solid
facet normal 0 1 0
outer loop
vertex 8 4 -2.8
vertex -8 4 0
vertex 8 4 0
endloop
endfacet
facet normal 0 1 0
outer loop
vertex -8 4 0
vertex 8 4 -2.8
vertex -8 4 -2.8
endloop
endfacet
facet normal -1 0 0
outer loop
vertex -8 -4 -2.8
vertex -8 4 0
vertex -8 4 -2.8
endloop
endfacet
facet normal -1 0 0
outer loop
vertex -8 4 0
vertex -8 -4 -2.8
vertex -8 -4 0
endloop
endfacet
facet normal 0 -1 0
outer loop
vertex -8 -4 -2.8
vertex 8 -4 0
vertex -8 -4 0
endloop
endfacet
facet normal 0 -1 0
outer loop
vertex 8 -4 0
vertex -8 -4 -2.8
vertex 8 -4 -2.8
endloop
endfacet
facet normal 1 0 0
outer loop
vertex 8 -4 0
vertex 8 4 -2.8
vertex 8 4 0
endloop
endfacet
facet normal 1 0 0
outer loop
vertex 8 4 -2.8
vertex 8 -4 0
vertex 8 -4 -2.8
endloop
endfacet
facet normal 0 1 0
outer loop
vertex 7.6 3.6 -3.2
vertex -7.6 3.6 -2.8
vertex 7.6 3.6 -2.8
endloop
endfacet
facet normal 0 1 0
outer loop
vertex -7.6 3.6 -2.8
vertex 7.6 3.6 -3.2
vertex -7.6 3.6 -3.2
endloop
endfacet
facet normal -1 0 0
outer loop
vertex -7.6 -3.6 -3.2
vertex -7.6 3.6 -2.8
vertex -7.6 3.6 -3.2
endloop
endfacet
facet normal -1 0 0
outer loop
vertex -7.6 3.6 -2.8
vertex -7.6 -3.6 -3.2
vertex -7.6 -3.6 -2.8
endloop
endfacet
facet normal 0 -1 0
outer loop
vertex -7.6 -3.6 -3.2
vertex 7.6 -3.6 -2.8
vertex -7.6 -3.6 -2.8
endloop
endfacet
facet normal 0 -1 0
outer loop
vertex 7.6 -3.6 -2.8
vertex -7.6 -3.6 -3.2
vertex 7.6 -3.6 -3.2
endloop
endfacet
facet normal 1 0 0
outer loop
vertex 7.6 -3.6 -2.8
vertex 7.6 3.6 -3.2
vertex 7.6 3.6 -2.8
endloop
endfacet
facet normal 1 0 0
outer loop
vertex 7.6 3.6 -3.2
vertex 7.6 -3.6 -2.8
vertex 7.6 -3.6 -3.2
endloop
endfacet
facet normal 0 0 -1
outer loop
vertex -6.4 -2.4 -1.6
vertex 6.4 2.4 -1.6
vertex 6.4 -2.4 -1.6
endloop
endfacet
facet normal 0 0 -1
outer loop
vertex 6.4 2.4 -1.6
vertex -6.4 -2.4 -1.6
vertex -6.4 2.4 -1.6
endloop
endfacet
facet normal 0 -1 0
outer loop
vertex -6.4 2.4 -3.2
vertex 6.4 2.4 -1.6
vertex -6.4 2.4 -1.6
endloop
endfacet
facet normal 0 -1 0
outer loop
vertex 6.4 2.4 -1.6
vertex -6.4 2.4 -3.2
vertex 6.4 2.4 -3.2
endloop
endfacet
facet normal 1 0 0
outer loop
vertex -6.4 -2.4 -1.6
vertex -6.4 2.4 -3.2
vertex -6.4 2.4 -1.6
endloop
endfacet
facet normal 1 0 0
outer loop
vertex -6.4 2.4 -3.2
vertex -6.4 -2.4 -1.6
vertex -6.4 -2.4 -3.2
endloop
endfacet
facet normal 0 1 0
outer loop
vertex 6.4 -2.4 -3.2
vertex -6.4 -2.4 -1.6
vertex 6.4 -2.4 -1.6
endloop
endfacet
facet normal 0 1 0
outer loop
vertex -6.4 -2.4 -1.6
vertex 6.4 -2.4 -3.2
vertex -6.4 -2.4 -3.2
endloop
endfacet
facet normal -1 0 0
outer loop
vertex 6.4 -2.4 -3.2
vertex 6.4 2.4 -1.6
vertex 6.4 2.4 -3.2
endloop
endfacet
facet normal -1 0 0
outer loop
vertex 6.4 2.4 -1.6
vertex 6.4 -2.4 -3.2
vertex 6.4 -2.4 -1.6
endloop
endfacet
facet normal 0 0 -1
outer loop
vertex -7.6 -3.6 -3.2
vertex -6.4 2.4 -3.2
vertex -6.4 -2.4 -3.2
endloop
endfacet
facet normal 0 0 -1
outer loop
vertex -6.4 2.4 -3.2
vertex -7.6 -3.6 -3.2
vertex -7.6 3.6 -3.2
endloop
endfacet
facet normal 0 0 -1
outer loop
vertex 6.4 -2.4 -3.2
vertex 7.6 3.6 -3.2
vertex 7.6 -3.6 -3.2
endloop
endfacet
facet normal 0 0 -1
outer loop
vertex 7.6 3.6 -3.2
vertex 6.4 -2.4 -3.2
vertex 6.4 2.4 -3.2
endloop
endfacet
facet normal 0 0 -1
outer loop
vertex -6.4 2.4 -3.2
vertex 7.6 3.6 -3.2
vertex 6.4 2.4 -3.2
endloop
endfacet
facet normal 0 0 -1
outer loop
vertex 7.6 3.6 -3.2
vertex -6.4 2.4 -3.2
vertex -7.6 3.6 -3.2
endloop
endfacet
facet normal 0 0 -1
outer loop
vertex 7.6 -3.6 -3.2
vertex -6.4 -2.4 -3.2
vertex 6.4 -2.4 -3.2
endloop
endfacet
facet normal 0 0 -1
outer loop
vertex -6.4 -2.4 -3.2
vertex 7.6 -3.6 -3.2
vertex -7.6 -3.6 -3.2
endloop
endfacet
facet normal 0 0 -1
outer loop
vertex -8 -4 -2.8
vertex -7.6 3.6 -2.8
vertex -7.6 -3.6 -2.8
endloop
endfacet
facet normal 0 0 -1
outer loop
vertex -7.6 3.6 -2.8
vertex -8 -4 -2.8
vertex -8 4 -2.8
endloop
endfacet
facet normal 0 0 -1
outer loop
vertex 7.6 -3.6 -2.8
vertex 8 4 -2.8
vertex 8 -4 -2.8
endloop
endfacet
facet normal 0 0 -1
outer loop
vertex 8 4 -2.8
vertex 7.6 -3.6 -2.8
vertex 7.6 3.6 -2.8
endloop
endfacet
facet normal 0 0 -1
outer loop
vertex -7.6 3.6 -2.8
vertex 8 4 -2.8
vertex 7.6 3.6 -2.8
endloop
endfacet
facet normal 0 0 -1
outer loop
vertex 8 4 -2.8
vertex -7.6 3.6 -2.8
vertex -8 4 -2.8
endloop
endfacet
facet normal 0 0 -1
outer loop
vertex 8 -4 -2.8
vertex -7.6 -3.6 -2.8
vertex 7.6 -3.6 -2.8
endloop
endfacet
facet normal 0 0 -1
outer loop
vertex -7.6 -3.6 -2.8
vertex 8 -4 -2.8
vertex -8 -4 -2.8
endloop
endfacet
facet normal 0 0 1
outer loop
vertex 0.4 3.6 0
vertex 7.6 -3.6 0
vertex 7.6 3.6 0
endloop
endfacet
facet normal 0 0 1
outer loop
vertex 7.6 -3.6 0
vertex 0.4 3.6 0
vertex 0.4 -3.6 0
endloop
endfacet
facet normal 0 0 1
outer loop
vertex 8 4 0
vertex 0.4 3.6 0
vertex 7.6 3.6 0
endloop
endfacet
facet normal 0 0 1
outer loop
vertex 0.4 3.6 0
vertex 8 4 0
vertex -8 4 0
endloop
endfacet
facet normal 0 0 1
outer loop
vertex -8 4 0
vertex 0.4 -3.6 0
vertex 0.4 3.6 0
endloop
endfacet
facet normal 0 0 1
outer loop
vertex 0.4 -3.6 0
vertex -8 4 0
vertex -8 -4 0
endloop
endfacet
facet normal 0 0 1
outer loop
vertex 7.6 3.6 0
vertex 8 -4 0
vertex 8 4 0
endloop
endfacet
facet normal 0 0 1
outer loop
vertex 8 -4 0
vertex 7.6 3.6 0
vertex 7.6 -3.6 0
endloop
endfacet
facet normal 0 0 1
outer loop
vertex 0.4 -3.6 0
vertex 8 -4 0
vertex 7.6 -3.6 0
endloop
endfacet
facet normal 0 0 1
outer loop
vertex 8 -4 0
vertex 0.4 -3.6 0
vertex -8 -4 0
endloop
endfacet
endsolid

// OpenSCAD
// file: ../p/box5.scad
use <../lib.scad>
function ldraw_lib__box5() = [
// 0 Box with 5 Faces and All Edges
// 0 Name: box5.dat
// 0 Author: James Jessiman
// 0 !LDRAW_ORG Primitive UPDATE 2012-01
// 0 !LICENSE Licensed under CC BY 2.0 and CC BY 4.0 : see CAreadme.txt
// 
// 0 BFC CERTIFY CCW
  [0,"BFC","CERTIFY"],
  [0,"BFC","CCW"],
// 
// 0 !HISTORY 2002-04-03 [sbliss] Modified for BFC compliance
// 0 !HISTORY 2002-04-25 [PTadmin] Official Update 2002-02
// 0 !HISTORY 2007-06-24 [PTadmin] Header formatted for Contributor Agreement
// 0 !HISTORY 2008-07-01 [PTadmin] Official Update 2008-01
// 0 !HISTORY 2012-02-16 [Philo] Changed to CCW
// 0 !HISTORY 2012-03-30 [PTadmin] Official Update 2012-01
// 
// 
// 2 24 1 1 1 -1 1 1
  [2,24,1,1,1,-1,1,1],
// 2 24 -1 1 1 -1 1 -1
  [2,24,-1,1,1,-1,1,-1],
// 2 24 -1 1 -1 1 1 -1
  [2,24,-1,1,-1,1,1,-1],
// 2 24 1 1 -1 1 1 1
  [2,24,1,1,-1,1,1,1],
// 2 24 1 0 1 -1 0 1
  [2,24,1,0,1,-1,0,1],
// 2 24 -1 0 1 -1 0 -1
  [2,24,-1,0,1,-1,0,-1],
// 2 24 -1 0 -1 1 0 -1
  [2,24,-1,0,-1,1,0,-1],
// 2 24 1 0 -1 1 0 1
  [2,24,1,0,-1,1,0,1],
// 2 24 1 0 1 1 1 1
  [2,24,1,0,1,1,1,1],
// 2 24 -1 0 1 -1 1 1
  [2,24,-1,0,1,-1,1,1],
// 2 24 1 0 -1 1 1 -1
  [2,24,1,0,-1,1,1,-1],
// 2 24 -1 0 -1 -1 1 -1
  [2,24,-1,0,-1,-1,1,-1],
// 4 16 -1 1 1 1 1 1 1 1 -1 -1 1 -1
  [4,16,-1,1,1,1,1,1,1,1,-1,-1,1,-1],
// 4 16 -1 1 1 -1 0 1 1 0 1 1 1 1
  [4,16,-1,1,1,-1,0,1,1,0,1,1,1,1],
// 4 16 -1 1 -1 -1 0 -1 -1 0 1 -1 1 1
  [4,16,-1,1,-1,-1,0,-1,-1,0,1,-1,1,1],
// 4 16 1 1 -1 1 0 -1 -1 0 -1 -1 1 -1
  [4,16,1,1,-1,1,0,-1,-1,0,-1,-1,1,-1],
// 4 16 1 1 1 1 0 1 1 0 -1 1 1 -1
  [4,16,1,1,1,1,0,1,1,0,-1,1,1,-1],
];
module ldraw_lib__box5(step=0, col=false, unit=2/5, alt=false, line=0.2, solid=!$preview)
    makepoly(ldraw_lib__box5(), step=step, col=col, unit=unit, alt=alt, line=line, solid=solid);
ldraw_lib__box5(line=0.2);
// file: ../p/box4.scad
use <../lib.scad>
function ldraw_lib__box4() = [
// 0 Box with 4 Faces (2 Parallel Pairs) and All Edges
// 0 Name: box4.dat
// 0 Author: James Jessiman
// 0 !LDRAW_ORG Primitive UPDATE 2012-01
// 0 !LICENSE Licensed under CC BY 2.0 and CC BY 4.0 : see CAreadme.txt
// 
// 0 BFC CERTIFY CCW
  [0,"BFC","CERTIFY"],
  [0,"BFC","CCW"],
// 
// 0 !HISTORY 2002-04-03 [sbliss] Modified for BFC compliance
// 0 !HISTORY 2002-04-25 [PTadmin] Official Update 2002-02
// 0 !HISTORY 2007-06-24 [PTadmin] Header formatted for Contributor Agreement
// 0 !HISTORY 2008-07-01 [PTadmin] Official Update 2008-01
// 0 !HISTORY 2012-02-16 [Philo] Changed to CCW
// 0 !HISTORY 2012-03-30 [PTadmin] Official Update 2012-01
// 
// 
// 2 24 1 1 1 -1 1 1
  [2,24,1,1,1,-1,1,1],
// 2 24 -1 1 1 -1 1 -1
  [2,24,-1,1,1,-1,1,-1],
// 2 24 -1 1 -1 1 1 -1
  [2,24,-1,1,-1,1,1,-1],
// 2 24 1 1 -1 1 1 1
  [2,24,1,1,-1,1,1,1],
// 2 24 1 0 1 -1 0 1
  [2,24,1,0,1,-1,0,1],
// 2 24 -1 0 1 -1 0 -1
  [2,24,-1,0,1,-1,0,-1],
// 2 24 -1 0 -1 1 0 -1
  [2,24,-1,0,-1,1,0,-1],
// 2 24 1 0 -1 1 0 1
  [2,24,1,0,-1,1,0,1],
// 2 24 1 0 1 1 1 1
  [2,24,1,0,1,1,1,1],
// 2 24 -1 0 1 -1 1 1
  [2,24,-1,0,1,-1,1,1],
// 2 24 1 0 -1 1 1 -1
  [2,24,1,0,-1,1,1,-1],
// 2 24 -1 0 -1 -1 1 -1
  [2,24,-1,0,-1,-1,1,-1],
// 4 16 -1 1 1 -1 0 1 1 0 1 1 1 1
  [4,16,-1,1,1,-1,0,1,1,0,1,1,1,1],
// 4 16 -1 1 -1 -1 0 -1 -1 0 1 -1 1 1
  [4,16,-1,1,-1,-1,0,-1,-1,0,1,-1,1,1],
// 4 16 1 1 -1 1 0 -1 -1 0 -1 -1 1 -1
  [4,16,1,1,-1,1,0,-1,-1,0,-1,-1,1,-1],
// 4 16 1 1 1 1 0 1 1 0 -1 1 1 -1
  [4,16,1,1,1,1,0,1,1,0,-1,1,1,-1],
];
module ldraw_lib__box4(step=0, col=false, unit=2/5, alt=false, line=0.2, solid=!$preview)
    makepoly(ldraw_lib__box4(), step=step, col=col, unit=unit, alt=alt, line=line, solid=solid);
ldraw_lib__box4(line=0.2);
// file: s/3069bs01.scad
use <../../lib.scad>
use <../../p/box4.scad>
use <../../p/box5.scad>
function ldraw_lib__s__3069bs01() = [
// 0 ~Tile  1 x  2 with Groove without Top Face
// 0 Name: s\3069bs01.dat
// 0 Author: Santeri Piippo [arezey]
// 0 !LDRAW_ORG Subpart UPDATE 2010-02
// 0 !LICENSE Licensed under CC BY 2.0 and CC BY 4.0 : see CAreadme.txt
// 
// 0 BFC CERTIFY CCW
  [0,"BFC","CERTIFY"],
  [0,"BFC","CCW"],
// 
// 0 !HISTORY 2010-07-05 [PTadmin] Official Update 2010-02
// 
// 
// 1 16 0 0 0 20 0 0 0 7 0 0 0 10 box4.dat
  [1,16,0,0,0,20,0,0,0,7,0,0,0,10, ldraw_lib__box4()],
// 1 16 0 7 0 19 0 0 0 1 0 0 0 9 box4.dat
  [1,16,0,7,0,19,0,0,0,1,0,0,0,9, ldraw_lib__box4()],
// 0 BFC INVERTNEXT
  [0,"BFC","INVERTNEXT"],
// 1 16 0 8 0 16 0 0 0 -4 0 0 0 6 box5.dat
  [1,16,0,8,0,16,0,0,0,-4,0,0,0,6, ldraw_lib__box5()],
// 4 16 -19 8 9 -16 8 6 -16 8 -6 -19 8 -9
  [4,16,-19,8,9,-16,8,6,-16,8,-6,-19,8,-9],
// 4 16 19 8 -9 16 8 -6 16 8 6 19 8 9
  [4,16,19,8,-9,16,8,-6,16,8,6,19,8,9],
// 4 16 19 8 9 16 8 6 -16 8 6 -19 8 9
  [4,16,19,8,9,16,8,6,-16,8,6,-19,8,9],
// 4 16 -19 8 -9 -16 8 -6 16 8 -6 19 8 -9
  [4,16,-19,8,-9,-16,8,-6,16,8,-6,19,8,-9],
// 4 16 -20 7 10 -19 7 9 -19 7 -9 -20 7 -10
  [4,16,-20,7,10,-19,7,9,-19,7,-9,-20,7,-10],
// 4 16 20 7 -10 19 7 -9 19 7 9 20 7 10
  [4,16,20,7,-10,19,7,-9,19,7,9,20,7,10],
// 4 16 20 7 10 19 7 9 -19 7 9 -20 7 10
  [4,16,20,7,10,19,7,9,-19,7,9,-20,7,10],
// 4 16 -20 7 -10 -19 7 -9 19 7 -9 20 7 -10
  [4,16,-20,7,-10,-19,7,-9,19,7,-9,20,7,-10],
// 0 //
];
module ldraw_lib__s__3069bs01(step=0, col=false, unit=2/5, alt=false, line=0.2, solid=!$preview)
    makepoly(ldraw_lib__s__3069bs01(), step=step, col=col, unit=unit, alt=alt, line=line, solid=solid);
ldraw_lib__s__3069bs01(line=0.2);
// main file
use <../lib.scad>
use <s/3069bs01.scad>
function ldraw_lib__3069bpy0() = [
// 0 Tile  1 x  2 with Yellow Square Off Centre Pattern
// 0 Name: 3069bpy0.dat
// 0 Author: Massimo Maso [Sirio]
// 0 !LDRAW_ORG Part UPDATE 2022-04
// 0 !LICENSE Licensed under CC BY 2.0 and CC BY 4.0 : see CAreadme.txt
// 
// 0 BFC CERTIFY CCW
  [0,"BFC","CERTIFY"],
  [0,"BFC","CCW"],
// 
// 0 !KEYWORDS Bricklink 3069bpb0957, C8.R, Car, Chevrolet, Corvette, Race
// 0 !KEYWORDS Set 76903, Speed Champions
// 
// 0 !HISTORY 2022-07-18 [PTadmin] Official Update 2022-04
// 
// 
// 0 // Subprts
// 
// 1 16 0 0 0 1 0 0 0 1 0 0 0 1 s\3069bs01.dat
  [1,16,0,0,0,1,0,0,0,1,0,0,0,1, ldraw_lib__s__3069bs01()],
// 0 // Top face
// 0 // Yellow faces
// 4 14 1 0 9 1 0 -9 19 0 -9 19 0 9
  [4,14,1,0,9,1,0,-9,19,0,-9,19,0,9],
// 0 // Neutral faces
// 4 16 -20 0 10 1 0 9 19 0 9 20 0 10
  [4,16,-20,0,10,1,0,9,19,0,9,20,0,10],
// 4 16 -20 0 10 -20 0 -10 1 0 -9 1 0 9
  [4,16,-20,0,10,-20,0,-10,1,0,-9,1,0,9],
// 4 16 20 0 -10 20 0 10 19 0 9 19 0 -9
  [4,16,20,0,-10,20,0,10,19,0,9,19,0,-9],
// 4 16 20 0 -10 19 0 -9 1 0 -9 -20 0 -10
  [4,16,20,0,-10,19,0,-9,1,0,-9,-20,0,-10],
];
module ldraw_lib__3069bpy0(step=0, col=false, unit=2/5, alt=false, line=0.2, solid=!$preview)
    makepoly(ldraw_lib__3069bpy0(), step=step, col=col, unit=unit, alt=alt, line=line, solid=solid);
ldraw_lib__3069bpy0(line=0.2);
